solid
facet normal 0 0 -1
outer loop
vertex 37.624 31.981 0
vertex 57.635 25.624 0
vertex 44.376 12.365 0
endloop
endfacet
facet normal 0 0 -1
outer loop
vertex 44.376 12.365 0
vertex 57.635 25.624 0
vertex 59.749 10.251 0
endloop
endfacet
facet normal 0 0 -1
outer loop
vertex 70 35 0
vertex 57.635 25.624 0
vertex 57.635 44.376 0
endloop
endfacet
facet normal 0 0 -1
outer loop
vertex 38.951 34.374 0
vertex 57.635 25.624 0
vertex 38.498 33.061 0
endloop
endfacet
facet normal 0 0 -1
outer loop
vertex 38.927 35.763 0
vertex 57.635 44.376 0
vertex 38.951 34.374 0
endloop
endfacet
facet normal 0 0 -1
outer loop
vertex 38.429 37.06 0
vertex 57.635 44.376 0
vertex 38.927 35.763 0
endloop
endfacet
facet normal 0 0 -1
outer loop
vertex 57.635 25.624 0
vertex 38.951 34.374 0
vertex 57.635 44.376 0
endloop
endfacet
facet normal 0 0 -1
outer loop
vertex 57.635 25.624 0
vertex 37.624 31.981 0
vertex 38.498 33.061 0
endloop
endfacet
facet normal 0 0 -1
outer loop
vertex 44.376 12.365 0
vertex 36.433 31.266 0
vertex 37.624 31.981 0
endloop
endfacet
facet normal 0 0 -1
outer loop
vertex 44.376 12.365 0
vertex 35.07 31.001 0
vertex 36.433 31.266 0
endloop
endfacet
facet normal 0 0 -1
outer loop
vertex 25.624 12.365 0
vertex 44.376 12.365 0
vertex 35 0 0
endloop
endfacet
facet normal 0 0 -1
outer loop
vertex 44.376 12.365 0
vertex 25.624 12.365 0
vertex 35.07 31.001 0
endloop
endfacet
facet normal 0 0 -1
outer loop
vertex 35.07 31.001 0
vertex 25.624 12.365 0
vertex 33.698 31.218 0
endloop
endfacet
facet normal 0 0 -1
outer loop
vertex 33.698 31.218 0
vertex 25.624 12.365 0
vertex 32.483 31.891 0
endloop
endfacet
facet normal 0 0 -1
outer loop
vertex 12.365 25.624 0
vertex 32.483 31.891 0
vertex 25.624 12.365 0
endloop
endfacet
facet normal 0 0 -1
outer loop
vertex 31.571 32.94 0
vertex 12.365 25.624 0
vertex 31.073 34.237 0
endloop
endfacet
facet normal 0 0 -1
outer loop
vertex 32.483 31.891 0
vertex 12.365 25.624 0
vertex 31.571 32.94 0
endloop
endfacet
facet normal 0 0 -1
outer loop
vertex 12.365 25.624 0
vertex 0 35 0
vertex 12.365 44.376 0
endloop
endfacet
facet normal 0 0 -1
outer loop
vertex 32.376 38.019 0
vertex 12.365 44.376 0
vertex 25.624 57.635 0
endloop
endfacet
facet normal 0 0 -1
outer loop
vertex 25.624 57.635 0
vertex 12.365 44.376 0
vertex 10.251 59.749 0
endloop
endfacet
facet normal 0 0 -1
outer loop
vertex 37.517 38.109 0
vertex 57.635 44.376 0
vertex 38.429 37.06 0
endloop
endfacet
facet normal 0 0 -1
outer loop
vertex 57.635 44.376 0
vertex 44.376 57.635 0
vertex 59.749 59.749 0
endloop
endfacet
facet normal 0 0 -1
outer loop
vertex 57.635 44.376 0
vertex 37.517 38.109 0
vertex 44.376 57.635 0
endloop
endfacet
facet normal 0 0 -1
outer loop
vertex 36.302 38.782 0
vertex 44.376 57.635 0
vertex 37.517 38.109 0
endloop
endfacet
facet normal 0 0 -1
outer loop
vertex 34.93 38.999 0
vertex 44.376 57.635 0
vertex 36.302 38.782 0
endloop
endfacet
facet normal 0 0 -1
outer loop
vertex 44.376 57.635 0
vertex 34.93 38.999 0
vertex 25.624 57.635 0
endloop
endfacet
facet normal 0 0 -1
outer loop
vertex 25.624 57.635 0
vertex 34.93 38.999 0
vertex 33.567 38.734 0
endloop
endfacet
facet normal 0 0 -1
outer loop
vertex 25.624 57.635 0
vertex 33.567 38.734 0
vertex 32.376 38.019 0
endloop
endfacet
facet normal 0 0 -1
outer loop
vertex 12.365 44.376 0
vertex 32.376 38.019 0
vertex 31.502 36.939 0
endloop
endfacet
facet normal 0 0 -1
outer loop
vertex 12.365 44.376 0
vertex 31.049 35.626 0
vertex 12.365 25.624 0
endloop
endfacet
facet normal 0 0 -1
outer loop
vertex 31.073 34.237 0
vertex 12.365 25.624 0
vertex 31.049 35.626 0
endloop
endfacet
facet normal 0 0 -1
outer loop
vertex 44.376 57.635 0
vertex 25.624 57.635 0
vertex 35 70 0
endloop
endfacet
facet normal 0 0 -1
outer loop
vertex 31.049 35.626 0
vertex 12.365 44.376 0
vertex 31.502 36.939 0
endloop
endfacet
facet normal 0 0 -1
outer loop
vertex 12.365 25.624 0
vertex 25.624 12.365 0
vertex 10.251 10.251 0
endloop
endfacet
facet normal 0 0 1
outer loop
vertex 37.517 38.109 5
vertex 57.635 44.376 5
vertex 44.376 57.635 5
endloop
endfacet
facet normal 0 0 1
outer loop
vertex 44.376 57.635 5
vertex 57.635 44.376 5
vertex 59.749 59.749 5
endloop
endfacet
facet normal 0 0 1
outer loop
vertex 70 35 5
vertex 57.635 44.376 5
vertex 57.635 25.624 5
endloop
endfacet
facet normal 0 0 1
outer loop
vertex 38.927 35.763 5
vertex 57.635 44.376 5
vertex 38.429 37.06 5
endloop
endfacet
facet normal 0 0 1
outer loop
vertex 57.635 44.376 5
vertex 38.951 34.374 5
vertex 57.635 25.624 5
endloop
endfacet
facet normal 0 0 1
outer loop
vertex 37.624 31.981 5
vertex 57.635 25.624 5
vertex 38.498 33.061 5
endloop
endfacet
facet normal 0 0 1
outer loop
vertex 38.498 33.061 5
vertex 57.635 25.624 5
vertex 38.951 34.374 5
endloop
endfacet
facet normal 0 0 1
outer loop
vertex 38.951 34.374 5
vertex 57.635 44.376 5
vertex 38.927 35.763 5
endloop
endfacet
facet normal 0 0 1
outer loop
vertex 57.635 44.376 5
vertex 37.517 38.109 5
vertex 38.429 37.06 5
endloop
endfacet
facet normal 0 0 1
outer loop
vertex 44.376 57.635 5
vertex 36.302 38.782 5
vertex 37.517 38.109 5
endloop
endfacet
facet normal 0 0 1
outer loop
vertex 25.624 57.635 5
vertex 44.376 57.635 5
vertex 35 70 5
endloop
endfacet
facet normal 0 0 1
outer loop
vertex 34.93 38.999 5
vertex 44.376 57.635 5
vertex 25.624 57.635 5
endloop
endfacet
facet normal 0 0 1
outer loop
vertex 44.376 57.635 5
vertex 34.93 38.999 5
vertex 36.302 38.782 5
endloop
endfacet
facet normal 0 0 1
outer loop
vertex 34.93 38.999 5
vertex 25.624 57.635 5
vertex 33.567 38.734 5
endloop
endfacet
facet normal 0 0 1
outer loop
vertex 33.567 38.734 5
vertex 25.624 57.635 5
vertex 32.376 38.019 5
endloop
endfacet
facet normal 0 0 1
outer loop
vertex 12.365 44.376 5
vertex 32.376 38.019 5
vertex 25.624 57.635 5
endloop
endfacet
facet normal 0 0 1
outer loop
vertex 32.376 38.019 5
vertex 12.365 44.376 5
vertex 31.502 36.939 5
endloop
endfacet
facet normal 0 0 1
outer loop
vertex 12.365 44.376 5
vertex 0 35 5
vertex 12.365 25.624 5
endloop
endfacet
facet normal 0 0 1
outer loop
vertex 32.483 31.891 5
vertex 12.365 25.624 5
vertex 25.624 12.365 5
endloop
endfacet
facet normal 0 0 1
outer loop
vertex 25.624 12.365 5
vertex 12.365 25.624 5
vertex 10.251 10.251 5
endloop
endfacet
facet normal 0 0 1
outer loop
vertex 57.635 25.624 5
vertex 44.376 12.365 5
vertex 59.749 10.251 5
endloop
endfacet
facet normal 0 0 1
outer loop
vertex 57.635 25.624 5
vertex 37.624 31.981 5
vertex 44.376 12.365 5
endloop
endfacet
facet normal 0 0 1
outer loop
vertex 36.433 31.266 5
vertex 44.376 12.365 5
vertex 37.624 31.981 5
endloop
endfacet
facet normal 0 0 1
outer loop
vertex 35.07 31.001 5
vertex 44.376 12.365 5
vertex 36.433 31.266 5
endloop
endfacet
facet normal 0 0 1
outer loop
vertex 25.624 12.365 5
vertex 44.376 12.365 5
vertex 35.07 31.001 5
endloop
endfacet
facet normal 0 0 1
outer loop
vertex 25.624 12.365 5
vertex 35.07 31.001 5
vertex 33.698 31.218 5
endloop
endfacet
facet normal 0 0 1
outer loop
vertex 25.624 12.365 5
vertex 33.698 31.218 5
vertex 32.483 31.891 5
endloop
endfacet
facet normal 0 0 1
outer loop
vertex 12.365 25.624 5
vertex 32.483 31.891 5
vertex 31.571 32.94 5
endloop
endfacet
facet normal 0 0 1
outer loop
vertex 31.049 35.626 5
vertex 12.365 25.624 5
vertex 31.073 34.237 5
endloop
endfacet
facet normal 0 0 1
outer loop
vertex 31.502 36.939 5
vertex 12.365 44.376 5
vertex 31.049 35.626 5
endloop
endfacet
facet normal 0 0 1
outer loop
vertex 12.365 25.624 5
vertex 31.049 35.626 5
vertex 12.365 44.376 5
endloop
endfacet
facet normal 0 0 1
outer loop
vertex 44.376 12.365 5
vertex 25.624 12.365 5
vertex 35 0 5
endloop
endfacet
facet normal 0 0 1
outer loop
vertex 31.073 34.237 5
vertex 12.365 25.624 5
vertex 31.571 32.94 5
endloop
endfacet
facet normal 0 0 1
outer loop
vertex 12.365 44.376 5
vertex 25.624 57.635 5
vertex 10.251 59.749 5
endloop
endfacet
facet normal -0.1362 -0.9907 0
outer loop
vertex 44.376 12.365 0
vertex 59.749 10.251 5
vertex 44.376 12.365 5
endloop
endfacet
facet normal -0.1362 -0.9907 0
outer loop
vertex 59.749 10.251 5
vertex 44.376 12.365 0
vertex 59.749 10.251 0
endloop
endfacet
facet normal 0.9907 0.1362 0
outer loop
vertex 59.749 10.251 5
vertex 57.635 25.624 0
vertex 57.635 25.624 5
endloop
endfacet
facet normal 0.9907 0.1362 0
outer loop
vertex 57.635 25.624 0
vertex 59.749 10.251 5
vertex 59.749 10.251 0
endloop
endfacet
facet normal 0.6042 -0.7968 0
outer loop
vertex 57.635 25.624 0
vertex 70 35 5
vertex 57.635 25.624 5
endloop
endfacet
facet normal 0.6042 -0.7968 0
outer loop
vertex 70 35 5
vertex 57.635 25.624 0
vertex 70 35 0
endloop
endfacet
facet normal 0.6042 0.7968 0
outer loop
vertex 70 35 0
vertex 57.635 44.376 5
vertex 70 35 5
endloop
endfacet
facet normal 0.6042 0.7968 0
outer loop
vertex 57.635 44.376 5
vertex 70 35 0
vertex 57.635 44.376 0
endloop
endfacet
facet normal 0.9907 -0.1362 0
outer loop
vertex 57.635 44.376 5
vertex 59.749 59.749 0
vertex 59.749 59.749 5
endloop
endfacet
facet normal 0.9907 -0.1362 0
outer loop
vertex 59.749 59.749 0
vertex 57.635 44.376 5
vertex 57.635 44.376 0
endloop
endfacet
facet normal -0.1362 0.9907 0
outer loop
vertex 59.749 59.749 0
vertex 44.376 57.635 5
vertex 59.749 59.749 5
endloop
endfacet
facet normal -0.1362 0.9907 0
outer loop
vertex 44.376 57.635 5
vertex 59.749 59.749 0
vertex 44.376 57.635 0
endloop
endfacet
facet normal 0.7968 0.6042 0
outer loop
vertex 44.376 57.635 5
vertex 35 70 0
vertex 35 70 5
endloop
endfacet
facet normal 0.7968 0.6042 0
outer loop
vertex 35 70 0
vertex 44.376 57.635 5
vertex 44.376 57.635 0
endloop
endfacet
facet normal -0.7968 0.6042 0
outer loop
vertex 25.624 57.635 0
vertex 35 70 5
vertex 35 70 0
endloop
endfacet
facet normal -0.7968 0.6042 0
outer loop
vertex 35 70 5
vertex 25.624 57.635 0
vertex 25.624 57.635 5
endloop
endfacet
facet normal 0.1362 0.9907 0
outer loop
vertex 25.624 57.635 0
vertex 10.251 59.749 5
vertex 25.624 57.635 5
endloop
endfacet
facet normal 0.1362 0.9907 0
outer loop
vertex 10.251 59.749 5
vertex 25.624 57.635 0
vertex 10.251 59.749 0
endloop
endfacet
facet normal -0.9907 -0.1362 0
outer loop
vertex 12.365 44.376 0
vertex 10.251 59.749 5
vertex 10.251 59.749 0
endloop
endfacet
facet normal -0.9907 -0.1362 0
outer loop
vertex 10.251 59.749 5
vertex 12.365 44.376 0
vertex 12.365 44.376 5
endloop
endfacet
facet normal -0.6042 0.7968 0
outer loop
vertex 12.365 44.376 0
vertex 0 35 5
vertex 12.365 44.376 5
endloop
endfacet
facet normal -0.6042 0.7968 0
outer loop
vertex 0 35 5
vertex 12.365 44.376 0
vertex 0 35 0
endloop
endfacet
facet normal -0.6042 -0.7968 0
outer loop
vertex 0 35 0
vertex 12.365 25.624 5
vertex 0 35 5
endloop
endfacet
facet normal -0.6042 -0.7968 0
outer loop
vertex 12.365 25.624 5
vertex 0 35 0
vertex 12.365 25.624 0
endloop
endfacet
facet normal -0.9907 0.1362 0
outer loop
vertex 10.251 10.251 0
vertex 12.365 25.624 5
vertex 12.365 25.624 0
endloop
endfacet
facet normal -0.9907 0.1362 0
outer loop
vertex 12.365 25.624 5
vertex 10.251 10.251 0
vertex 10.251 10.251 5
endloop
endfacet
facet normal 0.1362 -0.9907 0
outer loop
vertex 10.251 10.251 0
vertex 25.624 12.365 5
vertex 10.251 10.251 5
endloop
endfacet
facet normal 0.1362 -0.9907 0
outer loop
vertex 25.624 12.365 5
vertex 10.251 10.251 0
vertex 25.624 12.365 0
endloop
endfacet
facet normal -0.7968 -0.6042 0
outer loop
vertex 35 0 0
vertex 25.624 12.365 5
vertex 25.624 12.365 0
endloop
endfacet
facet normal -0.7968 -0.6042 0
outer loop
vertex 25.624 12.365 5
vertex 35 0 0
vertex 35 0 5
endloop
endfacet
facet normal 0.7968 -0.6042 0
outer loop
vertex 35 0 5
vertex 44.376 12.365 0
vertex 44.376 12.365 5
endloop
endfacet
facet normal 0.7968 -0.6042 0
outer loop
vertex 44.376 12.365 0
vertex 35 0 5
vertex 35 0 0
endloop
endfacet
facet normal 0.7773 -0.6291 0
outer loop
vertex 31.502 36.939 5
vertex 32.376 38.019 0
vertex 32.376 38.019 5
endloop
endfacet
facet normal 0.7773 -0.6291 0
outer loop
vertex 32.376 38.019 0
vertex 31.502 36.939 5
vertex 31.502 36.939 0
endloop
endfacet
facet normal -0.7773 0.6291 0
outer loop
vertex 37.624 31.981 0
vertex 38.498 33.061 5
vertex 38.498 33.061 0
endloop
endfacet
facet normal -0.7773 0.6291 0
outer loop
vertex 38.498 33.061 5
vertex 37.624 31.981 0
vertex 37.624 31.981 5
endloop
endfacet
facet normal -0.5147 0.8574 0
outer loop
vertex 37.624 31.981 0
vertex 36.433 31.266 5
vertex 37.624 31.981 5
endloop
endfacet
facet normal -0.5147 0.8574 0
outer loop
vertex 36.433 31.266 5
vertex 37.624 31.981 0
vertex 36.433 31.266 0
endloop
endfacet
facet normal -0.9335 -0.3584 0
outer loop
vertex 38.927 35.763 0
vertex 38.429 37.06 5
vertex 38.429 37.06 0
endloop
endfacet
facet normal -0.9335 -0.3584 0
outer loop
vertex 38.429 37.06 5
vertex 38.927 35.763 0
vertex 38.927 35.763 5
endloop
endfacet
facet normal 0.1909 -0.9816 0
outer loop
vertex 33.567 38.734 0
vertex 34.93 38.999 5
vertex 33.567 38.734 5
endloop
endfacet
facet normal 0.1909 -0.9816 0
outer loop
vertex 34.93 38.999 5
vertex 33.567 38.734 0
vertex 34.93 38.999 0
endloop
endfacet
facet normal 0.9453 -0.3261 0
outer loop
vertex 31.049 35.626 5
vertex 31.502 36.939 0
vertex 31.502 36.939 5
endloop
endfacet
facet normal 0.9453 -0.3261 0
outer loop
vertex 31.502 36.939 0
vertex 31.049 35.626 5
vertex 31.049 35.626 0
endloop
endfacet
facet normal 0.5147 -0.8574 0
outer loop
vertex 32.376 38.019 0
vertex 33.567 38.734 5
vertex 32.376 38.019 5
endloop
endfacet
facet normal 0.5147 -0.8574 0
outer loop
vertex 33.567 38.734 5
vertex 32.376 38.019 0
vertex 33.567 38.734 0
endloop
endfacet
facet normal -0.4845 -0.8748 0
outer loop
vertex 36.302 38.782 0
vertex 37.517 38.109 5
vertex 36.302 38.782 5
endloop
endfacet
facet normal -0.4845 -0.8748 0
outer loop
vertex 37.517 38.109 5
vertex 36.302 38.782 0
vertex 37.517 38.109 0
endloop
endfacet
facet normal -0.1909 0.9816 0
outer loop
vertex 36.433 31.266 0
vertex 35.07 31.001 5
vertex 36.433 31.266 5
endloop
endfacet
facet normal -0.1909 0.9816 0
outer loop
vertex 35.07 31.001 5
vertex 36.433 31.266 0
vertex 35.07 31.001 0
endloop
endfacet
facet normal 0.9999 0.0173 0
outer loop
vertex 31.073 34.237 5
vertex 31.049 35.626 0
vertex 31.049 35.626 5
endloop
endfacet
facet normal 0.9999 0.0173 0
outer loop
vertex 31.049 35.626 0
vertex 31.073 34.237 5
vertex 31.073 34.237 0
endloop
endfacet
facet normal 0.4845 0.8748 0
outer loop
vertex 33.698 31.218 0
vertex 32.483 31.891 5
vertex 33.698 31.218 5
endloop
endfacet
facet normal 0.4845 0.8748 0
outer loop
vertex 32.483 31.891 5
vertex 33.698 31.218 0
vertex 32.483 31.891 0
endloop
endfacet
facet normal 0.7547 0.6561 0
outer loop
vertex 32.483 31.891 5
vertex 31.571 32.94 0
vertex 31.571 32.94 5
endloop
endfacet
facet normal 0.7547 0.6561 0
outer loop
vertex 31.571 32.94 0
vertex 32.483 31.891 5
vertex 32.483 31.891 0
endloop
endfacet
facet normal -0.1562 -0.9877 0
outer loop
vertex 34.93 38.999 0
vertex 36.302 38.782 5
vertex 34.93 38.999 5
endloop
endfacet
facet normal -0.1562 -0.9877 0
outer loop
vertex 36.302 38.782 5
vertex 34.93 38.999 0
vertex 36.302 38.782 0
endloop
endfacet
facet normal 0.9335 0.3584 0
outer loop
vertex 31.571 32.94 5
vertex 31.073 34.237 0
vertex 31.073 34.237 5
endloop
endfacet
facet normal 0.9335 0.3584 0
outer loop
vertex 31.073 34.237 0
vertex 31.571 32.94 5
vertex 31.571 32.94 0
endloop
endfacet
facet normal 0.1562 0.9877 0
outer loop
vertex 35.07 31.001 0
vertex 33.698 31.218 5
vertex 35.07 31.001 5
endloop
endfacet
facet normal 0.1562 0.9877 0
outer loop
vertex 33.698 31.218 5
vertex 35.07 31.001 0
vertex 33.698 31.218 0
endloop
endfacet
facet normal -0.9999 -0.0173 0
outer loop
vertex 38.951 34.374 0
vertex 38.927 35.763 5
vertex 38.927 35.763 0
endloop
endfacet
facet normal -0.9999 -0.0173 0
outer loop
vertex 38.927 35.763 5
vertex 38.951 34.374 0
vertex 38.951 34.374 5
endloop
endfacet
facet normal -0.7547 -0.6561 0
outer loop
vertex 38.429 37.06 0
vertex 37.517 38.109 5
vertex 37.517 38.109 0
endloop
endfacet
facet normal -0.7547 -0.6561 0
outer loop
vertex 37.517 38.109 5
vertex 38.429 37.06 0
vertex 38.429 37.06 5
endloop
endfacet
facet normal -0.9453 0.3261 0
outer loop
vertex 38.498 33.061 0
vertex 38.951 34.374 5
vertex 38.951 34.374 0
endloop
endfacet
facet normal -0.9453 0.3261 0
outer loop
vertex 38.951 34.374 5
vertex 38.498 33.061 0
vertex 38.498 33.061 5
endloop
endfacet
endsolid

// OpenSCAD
$fn = 32;

// ----------------------------------------------------------------------
// Star wheel: 8-point blunt, R35
// ----------------------------------------------------------------------

// --- parameters (mm) ---
n_points = 8;             // number of points / teeth
r_out = 35;               // tip radius
r_in = 24.5;              // root radius
bore_r = 4;               // centre bore radius
plate_t = 5;              // plate thickness, Z (extrusion height)
bore_d = 8;               // centre bore diameter

profile = [[0, 35], [12.365, 25.624], [10.251, 10.251], [25.624, 12.365], [35, 0], [44.376, 12.365], [59.749, 10.251], [57.635, 25.624], [70, 35], [57.635, 44.376], [59.749, 59.749], [44.376, 57.635], [35, 70], [25.624, 57.635], [10.251, 59.749], [12.365, 44.376]];  // primary outline, 16 points, counter clockwise
void_1 = [[38.927, 35.763], [38.429, 37.06], [37.517, 38.109], [36.302, 38.782], [34.93, 38.999], [33.567, 38.734], [32.376, 38.019], [31.502, 36.939], [31.049, 35.626], [31.073, 34.237], [31.571, 32.94], [32.483, 31.891], [33.698, 31.218], [35.07, 31.001], [36.433, 31.266], [37.624, 31.981], [38.498, 33.061], [38.951, 34.374]];  // centre bore, 18 points

// --- the one profile operation ---
difference() {
  linear_extrude(height = plate_t) polygon(points = profile);
  translate([0, 0, -1])
    linear_extrude(height = plate_t + 2) polygon(points = void_1);
}
